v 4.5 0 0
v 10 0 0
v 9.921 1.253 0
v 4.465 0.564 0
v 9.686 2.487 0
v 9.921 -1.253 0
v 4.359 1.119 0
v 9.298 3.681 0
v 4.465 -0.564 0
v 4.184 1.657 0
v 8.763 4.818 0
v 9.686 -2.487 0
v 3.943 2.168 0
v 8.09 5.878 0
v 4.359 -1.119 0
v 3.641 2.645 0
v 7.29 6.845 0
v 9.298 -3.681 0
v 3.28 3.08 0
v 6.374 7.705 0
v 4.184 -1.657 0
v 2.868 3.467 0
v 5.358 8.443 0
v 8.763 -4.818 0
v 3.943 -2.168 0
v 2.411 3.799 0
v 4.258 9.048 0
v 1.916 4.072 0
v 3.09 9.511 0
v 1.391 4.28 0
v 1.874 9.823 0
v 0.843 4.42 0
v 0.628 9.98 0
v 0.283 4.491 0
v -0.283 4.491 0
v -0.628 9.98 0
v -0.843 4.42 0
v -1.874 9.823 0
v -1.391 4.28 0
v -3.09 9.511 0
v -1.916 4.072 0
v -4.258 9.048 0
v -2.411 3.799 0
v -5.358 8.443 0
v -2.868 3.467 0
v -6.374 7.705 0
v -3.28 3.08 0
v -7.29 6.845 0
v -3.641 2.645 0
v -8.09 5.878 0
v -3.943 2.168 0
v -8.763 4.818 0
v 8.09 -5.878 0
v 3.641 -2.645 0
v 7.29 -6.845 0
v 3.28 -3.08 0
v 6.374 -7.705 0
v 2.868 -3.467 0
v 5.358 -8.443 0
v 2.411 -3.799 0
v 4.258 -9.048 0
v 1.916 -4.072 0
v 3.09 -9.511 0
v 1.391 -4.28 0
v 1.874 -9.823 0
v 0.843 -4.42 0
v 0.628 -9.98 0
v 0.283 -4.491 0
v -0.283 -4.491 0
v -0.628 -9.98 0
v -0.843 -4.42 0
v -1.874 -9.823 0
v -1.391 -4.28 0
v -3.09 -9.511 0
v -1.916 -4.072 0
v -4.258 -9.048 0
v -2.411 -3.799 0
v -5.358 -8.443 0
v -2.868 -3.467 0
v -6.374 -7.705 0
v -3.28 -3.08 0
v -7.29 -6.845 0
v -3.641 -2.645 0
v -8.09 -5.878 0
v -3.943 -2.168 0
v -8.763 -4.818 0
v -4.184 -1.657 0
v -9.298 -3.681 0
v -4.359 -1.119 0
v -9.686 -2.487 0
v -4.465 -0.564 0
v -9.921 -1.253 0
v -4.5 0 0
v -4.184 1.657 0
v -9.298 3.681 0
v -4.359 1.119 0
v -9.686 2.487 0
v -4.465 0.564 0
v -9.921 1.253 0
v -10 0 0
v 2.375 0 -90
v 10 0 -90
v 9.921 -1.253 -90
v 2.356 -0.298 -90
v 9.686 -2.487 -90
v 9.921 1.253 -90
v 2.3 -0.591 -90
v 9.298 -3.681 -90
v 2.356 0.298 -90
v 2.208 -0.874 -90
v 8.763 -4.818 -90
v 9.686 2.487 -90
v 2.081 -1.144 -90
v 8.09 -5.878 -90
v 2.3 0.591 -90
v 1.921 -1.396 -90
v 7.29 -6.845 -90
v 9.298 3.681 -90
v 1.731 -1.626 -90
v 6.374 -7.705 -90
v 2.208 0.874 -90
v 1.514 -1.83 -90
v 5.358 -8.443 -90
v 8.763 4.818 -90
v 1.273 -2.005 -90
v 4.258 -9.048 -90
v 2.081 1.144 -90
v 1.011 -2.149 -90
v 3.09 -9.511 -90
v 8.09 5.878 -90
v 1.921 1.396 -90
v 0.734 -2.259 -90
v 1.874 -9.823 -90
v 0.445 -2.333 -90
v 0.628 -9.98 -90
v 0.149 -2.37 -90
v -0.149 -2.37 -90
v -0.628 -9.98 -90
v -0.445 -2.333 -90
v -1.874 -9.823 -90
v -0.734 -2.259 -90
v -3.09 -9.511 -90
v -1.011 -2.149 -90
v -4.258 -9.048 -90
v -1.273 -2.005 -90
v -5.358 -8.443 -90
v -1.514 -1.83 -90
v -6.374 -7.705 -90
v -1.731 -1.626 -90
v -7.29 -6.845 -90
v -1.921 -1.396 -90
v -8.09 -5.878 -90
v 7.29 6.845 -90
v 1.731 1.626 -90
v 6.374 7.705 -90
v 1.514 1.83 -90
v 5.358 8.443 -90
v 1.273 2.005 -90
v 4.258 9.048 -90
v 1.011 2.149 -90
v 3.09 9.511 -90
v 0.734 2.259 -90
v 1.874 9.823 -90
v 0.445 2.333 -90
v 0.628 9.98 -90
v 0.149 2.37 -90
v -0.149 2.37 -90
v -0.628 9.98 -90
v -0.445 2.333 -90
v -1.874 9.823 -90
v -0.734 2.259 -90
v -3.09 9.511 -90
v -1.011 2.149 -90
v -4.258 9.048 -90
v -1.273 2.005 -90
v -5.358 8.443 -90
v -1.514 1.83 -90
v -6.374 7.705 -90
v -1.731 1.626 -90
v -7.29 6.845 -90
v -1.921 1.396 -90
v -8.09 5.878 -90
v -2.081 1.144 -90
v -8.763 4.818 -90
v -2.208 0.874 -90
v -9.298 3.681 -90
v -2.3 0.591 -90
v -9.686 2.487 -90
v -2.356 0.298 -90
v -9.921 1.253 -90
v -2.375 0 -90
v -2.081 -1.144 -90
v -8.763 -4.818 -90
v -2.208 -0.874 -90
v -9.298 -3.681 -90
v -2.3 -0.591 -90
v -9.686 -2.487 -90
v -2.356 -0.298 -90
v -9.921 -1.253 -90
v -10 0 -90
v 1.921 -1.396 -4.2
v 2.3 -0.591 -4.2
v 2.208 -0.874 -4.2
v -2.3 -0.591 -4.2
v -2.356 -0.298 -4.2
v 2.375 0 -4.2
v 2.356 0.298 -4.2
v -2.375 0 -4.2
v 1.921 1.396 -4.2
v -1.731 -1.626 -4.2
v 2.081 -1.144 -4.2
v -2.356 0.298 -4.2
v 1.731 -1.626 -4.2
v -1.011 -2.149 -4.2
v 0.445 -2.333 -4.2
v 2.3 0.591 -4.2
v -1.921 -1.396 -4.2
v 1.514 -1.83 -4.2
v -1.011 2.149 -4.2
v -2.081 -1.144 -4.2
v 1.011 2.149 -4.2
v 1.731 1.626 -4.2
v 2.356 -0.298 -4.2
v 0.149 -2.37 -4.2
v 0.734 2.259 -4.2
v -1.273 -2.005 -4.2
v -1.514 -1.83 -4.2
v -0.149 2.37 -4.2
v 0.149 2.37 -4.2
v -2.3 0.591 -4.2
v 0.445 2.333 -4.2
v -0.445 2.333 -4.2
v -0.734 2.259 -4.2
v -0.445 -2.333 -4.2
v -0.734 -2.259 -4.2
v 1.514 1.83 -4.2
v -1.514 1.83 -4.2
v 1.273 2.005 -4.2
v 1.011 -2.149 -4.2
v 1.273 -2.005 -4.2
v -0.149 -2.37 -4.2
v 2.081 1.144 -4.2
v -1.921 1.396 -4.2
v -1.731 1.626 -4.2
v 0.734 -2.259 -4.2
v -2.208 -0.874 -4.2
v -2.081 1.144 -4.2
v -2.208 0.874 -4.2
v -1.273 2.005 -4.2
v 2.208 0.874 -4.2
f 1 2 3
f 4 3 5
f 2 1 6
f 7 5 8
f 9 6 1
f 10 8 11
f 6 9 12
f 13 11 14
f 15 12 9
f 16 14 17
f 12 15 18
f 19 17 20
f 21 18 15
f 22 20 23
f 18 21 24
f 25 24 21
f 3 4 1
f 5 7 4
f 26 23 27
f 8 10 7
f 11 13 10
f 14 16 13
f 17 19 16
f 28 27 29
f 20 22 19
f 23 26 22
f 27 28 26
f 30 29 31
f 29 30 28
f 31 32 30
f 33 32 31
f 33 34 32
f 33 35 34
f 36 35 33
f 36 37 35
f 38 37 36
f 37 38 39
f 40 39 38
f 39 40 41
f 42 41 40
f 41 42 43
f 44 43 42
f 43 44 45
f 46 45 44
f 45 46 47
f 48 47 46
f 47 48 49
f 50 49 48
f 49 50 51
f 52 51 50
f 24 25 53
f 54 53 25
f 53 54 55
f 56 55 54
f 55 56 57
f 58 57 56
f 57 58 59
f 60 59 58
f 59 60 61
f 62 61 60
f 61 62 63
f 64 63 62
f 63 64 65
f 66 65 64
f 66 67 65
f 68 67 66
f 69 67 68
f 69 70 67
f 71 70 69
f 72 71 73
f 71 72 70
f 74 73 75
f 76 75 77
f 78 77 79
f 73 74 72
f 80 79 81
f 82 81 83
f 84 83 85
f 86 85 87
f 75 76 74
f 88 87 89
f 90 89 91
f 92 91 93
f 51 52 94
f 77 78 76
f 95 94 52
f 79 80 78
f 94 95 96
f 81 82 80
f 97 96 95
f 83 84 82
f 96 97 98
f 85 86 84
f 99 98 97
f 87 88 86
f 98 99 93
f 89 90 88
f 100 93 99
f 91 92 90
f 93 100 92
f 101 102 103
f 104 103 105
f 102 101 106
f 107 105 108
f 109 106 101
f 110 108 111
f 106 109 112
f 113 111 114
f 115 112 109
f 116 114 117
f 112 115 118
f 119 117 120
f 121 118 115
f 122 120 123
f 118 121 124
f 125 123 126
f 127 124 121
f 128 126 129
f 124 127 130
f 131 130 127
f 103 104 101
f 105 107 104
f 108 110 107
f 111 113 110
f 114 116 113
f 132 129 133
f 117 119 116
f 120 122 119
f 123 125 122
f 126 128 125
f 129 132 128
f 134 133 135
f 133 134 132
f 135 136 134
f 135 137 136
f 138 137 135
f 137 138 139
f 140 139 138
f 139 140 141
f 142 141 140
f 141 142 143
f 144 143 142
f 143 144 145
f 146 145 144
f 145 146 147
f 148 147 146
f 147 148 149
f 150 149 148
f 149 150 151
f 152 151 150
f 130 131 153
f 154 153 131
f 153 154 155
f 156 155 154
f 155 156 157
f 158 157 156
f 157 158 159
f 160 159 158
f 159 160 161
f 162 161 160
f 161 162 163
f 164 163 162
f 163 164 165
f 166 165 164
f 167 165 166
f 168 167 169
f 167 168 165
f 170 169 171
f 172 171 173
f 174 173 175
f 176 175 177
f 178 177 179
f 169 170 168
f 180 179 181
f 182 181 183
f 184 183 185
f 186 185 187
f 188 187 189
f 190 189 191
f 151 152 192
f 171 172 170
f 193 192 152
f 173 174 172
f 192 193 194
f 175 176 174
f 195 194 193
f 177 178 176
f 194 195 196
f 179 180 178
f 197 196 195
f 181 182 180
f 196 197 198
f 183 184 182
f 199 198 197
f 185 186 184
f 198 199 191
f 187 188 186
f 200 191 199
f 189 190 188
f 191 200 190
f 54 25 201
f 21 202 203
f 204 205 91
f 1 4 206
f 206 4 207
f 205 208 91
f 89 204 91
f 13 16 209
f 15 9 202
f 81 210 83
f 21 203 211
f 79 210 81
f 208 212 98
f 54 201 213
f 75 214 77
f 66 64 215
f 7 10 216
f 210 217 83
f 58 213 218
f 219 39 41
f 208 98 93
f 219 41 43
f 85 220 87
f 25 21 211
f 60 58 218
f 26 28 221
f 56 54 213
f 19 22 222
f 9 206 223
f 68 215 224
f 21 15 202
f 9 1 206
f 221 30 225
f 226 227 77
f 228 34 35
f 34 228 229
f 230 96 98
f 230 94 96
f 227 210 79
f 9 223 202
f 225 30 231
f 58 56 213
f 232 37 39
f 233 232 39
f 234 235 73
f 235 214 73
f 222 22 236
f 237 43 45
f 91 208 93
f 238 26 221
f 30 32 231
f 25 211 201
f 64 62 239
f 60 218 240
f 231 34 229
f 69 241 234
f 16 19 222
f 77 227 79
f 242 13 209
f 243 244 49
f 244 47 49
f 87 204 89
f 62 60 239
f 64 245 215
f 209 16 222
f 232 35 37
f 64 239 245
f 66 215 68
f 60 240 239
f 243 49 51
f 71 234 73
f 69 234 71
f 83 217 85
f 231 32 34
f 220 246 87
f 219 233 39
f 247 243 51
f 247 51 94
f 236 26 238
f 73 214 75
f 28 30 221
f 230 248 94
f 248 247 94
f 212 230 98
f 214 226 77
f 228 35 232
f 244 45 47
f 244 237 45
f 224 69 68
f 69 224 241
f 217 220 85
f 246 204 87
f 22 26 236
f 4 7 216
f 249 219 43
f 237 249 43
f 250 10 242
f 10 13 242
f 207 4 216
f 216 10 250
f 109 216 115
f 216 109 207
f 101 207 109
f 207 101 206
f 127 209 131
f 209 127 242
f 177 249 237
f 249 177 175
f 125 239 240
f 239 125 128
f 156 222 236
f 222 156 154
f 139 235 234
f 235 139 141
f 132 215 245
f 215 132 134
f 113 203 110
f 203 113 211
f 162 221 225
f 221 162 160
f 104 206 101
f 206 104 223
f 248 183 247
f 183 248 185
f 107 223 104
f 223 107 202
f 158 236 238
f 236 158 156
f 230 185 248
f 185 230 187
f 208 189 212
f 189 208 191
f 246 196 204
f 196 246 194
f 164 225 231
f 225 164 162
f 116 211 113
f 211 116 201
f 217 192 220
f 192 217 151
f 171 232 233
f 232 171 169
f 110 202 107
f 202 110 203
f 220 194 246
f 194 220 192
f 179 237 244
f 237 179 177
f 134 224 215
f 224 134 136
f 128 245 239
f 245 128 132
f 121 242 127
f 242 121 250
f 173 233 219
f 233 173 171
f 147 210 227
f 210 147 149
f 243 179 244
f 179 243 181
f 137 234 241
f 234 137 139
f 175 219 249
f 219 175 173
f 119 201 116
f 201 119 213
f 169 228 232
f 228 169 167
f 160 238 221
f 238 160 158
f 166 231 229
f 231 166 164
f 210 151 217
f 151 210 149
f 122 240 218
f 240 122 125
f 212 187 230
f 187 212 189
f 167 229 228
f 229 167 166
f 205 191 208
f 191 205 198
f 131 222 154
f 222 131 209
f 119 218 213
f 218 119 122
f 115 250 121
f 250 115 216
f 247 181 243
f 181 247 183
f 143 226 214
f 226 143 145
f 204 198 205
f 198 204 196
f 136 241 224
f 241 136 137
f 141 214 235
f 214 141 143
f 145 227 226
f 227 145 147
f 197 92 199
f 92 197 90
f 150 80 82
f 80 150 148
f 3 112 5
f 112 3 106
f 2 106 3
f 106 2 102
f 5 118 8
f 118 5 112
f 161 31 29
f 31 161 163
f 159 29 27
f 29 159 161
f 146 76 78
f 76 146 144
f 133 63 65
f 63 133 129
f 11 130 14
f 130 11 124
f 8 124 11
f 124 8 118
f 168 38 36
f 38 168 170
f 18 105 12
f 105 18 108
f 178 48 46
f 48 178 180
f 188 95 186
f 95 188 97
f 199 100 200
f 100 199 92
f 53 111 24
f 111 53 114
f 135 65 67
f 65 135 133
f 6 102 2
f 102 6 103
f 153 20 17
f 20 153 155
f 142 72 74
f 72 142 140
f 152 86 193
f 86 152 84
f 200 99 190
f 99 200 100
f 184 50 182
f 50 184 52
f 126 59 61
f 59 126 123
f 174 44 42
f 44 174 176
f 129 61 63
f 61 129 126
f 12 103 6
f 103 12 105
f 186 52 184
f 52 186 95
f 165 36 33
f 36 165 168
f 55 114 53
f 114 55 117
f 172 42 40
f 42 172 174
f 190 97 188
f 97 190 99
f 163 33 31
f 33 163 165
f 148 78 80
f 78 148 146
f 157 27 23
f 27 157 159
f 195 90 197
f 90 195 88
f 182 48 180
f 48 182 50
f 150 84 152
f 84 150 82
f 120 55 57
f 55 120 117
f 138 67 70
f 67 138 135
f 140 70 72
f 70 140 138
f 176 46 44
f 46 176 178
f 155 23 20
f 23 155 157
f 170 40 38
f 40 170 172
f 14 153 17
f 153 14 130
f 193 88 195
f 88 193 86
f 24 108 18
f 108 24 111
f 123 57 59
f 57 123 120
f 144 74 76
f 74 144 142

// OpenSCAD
$fn = 50;


difference() {
	union() {
		translate(v = [0, 0, -90.0000000000]) {
			cylinder(h = 90, r = 10.0000000000);
		}
		cylinder(h = 0, r = 19.0000000000);
	}
	union() {
		translate(v = [0, 0, 0]) {
			rotate(a = [0, 0, 0]) {
				difference() {
					union() {
						#translate(v = [0, 0, -90.0000000000]) {
							cylinder(h = 90, r = 2.2500000000);
						}
						#translate(v = [0, 0, -4.2000000000]) {
							cylinder(h = 4.2000000000, r = 10.0000000000, r1 = 2.3750000000, r2 = 4.5000000000);
						}
						#translate(v = [0, 0, -90.0000000000]) {
							cylinder(h = 90, r = 2.3750000000);
						}
						#translate(v = [0, 0, -90.0000000000]) {
							cylinder(h = 90, r = 2.2500000000);
						}
					}
					union();
				}
			}
		}
	}
}
